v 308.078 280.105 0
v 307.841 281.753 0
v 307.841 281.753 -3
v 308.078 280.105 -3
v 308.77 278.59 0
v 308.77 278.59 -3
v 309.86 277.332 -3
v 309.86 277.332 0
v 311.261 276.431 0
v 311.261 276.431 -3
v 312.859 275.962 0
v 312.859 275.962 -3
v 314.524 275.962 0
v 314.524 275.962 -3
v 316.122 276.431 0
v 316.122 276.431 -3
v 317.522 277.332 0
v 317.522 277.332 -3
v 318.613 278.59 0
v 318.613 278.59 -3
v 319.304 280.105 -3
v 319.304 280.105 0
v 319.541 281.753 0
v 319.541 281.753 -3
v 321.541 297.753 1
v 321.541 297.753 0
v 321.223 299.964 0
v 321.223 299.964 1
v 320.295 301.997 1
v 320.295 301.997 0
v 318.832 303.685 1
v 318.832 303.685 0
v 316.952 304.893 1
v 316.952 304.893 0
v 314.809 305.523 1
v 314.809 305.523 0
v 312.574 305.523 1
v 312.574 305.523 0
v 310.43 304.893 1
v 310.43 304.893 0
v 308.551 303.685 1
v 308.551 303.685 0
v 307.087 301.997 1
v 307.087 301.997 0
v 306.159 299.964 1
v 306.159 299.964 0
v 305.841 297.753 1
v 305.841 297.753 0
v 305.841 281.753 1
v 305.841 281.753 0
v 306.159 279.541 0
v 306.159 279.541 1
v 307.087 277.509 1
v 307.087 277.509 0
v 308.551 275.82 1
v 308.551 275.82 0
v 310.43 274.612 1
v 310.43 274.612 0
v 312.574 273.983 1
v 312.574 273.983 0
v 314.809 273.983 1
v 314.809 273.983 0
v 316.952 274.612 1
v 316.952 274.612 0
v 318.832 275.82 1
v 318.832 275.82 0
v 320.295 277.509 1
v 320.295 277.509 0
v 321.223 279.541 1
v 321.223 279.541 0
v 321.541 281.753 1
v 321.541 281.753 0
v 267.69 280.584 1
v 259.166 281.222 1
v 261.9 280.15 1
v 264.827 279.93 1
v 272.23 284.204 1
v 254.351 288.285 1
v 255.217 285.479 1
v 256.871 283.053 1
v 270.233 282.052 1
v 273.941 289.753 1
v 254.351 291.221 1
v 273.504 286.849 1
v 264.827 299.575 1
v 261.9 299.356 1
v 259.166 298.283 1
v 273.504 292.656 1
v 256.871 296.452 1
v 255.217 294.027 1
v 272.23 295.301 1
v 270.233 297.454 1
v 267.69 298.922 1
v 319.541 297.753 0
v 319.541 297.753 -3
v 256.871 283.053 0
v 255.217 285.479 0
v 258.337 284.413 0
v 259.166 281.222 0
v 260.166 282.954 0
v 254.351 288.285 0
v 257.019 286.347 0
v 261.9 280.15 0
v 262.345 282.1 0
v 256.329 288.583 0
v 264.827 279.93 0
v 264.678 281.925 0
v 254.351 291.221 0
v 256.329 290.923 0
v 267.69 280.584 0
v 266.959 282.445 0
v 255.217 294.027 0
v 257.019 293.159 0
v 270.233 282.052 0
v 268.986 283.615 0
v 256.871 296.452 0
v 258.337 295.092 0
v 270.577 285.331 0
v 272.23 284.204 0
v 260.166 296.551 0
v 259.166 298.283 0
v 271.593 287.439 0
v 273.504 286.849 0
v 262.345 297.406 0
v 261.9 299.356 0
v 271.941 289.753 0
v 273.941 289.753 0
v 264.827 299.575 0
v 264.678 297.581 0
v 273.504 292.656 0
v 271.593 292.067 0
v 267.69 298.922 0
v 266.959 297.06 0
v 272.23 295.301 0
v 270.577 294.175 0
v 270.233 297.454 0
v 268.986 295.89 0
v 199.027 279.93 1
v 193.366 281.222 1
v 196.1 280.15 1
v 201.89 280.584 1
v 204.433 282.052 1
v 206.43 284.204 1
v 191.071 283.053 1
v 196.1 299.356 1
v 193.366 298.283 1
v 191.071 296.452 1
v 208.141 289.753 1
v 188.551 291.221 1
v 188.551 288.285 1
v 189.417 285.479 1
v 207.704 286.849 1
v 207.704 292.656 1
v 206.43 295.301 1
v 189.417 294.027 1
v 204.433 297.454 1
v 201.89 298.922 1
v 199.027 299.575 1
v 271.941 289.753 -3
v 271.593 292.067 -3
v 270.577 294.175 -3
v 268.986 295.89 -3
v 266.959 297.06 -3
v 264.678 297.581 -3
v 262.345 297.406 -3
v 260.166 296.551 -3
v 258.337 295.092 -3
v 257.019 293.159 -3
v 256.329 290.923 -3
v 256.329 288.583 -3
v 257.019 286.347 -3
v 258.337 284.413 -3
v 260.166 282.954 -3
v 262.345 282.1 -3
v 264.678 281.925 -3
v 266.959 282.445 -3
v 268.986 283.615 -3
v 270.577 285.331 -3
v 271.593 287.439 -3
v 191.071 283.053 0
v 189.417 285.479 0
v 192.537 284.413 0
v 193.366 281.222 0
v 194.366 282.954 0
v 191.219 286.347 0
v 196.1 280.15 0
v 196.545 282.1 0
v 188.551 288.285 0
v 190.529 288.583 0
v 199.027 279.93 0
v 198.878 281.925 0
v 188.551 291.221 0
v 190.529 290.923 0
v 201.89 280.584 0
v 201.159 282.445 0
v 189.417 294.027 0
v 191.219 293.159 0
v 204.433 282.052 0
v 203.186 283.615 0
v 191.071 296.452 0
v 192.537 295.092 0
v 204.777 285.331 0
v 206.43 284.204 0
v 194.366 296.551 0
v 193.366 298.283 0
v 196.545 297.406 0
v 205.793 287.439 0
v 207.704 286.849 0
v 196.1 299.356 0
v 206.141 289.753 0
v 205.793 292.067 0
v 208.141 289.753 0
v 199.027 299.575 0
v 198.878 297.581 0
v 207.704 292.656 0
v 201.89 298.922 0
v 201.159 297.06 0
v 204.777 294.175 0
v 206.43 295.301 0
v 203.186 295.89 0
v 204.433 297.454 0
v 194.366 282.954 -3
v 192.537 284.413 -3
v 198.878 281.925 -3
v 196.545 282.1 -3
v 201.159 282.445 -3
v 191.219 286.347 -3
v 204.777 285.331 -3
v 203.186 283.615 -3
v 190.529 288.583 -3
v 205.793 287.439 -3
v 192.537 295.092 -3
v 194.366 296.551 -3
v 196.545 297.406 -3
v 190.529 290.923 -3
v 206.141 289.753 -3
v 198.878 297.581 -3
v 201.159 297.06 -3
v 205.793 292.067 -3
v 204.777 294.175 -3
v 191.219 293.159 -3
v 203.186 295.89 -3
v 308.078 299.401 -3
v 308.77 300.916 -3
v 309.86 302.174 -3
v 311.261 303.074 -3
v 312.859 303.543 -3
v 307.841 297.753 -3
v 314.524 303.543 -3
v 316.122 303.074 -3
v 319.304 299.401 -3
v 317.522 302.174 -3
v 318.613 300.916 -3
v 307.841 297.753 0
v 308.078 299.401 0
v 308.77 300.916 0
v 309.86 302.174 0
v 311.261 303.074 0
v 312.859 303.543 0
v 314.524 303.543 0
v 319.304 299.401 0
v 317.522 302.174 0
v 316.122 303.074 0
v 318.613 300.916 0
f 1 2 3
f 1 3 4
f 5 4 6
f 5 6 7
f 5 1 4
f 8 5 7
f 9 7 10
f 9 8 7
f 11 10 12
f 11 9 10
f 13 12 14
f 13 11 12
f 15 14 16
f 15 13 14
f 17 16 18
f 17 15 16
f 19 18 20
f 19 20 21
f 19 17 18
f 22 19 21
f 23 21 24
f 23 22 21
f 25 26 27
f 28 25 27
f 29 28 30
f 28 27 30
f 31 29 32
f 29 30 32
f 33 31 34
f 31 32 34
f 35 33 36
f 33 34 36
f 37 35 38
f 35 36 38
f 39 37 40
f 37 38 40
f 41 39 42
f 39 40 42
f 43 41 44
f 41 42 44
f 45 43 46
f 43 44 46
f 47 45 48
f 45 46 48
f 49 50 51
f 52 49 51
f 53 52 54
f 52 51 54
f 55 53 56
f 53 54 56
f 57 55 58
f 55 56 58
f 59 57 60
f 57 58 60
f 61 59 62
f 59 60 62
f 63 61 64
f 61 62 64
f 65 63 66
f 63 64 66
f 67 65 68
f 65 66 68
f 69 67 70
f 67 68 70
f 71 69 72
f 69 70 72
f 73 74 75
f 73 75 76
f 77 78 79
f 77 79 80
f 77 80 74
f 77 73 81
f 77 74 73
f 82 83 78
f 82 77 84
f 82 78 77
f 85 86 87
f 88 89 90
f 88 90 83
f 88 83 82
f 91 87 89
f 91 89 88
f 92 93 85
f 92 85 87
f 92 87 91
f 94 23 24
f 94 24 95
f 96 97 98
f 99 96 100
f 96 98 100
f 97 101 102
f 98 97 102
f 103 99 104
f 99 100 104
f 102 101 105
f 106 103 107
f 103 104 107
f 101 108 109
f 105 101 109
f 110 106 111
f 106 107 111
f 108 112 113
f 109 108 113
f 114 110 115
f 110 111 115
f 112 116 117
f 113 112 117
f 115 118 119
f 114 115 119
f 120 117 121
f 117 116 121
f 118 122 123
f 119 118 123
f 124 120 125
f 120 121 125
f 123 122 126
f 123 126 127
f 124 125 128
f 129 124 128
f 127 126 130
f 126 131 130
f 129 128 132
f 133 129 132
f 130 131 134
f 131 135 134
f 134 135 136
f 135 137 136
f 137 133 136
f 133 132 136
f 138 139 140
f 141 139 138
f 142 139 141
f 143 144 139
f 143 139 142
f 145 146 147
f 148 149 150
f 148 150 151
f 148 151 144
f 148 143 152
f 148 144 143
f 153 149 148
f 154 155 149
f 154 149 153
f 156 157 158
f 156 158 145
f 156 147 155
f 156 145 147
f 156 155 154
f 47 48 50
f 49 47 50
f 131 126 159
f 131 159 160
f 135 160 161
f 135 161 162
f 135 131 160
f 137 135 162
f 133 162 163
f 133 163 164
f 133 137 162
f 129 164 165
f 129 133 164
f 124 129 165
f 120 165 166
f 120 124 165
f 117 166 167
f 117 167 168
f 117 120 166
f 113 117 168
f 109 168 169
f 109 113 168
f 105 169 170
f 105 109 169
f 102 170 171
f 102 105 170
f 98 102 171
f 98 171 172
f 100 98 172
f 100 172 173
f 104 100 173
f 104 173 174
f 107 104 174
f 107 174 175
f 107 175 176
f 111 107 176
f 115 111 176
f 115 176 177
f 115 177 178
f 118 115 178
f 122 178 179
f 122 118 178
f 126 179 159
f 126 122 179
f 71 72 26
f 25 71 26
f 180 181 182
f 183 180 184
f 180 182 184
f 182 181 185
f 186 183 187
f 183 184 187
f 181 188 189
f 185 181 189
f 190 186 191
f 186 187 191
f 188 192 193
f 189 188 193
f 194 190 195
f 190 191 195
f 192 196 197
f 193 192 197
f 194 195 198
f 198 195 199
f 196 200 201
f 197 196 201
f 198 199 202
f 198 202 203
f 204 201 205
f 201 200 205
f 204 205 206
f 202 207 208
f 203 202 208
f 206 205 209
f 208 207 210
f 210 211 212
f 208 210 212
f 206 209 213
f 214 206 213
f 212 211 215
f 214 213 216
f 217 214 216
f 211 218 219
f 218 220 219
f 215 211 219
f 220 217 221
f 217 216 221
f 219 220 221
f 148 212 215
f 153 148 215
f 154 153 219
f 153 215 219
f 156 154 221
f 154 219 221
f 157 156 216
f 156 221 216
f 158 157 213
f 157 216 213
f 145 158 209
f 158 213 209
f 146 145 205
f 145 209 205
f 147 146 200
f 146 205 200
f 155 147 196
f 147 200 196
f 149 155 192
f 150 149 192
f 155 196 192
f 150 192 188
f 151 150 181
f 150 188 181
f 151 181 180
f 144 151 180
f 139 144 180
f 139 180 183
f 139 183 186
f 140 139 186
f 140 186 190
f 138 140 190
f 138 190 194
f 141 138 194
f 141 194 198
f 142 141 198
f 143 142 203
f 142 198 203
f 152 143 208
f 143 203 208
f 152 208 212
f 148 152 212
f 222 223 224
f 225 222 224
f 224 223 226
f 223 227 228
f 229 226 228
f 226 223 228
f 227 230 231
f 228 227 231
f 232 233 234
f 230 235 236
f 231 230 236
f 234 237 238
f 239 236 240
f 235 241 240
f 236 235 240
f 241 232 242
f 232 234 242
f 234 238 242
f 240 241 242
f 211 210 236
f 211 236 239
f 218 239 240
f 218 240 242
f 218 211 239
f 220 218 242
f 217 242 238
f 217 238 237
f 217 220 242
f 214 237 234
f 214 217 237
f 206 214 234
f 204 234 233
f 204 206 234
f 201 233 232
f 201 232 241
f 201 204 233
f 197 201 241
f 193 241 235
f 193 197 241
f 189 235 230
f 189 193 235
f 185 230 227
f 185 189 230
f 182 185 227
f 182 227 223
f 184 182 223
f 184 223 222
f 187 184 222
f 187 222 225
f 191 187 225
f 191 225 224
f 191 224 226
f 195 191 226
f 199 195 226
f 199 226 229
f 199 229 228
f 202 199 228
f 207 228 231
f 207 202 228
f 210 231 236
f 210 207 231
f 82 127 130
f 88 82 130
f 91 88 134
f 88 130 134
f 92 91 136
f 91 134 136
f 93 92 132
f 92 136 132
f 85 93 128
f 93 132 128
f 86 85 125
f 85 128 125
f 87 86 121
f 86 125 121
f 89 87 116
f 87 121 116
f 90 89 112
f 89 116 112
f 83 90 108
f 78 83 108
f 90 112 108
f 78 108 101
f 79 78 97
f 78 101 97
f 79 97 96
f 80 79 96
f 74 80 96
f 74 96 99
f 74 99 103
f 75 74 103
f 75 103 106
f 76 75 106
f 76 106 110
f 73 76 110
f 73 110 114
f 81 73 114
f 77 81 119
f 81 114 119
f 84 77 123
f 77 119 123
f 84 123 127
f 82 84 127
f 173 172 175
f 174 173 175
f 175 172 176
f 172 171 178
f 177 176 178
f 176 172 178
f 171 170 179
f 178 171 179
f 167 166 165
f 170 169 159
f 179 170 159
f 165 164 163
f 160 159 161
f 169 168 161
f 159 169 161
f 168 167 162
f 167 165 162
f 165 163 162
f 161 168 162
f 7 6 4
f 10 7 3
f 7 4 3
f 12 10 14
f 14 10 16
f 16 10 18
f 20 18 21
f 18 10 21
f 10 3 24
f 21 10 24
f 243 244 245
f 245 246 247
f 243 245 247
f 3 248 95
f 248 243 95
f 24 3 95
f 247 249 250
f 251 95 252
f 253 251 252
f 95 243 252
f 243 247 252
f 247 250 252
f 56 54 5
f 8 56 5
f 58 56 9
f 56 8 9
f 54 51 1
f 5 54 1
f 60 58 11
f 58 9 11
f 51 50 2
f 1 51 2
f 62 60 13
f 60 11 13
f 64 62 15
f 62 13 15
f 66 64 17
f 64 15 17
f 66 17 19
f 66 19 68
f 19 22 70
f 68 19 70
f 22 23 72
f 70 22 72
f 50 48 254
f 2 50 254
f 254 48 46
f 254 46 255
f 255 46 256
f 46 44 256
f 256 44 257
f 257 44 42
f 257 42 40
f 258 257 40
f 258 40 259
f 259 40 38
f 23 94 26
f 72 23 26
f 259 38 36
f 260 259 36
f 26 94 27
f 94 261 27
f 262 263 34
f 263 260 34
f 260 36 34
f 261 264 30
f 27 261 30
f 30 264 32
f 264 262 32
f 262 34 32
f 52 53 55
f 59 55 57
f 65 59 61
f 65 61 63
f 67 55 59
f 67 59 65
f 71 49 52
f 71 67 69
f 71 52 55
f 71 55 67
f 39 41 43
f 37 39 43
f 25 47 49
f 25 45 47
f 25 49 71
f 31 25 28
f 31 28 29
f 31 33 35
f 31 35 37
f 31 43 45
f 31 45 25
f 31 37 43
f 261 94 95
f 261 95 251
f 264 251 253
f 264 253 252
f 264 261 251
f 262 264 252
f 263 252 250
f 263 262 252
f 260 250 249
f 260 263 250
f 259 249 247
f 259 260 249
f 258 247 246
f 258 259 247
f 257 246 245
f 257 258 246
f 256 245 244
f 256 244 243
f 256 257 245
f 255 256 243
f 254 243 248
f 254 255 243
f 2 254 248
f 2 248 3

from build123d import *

# Parameters (mm, degrees)
SKETCH1_R             = 7.85
BOSS_EXTRUDE1_DEPTH   = 3
BOSS_EXTRUDE1_2_DEPTH = 3
BOSS_EXTRUDE1_3_DEPTH = 3
SKETCH2_R             = 9.85
BOSS_EXTRUDE2_DEPTH   = 1


with BuildPart() as part:
    # Sketch1 → Boss-Extrude1 (new body)
    with BuildSketch(Plane.XY):
        with Locations((198.291338583, 289.752755906)):
            Circle(SKETCH1_R)
    extrude(amount=-BOSS_EXTRUDE1_DEPTH)



with BuildPart() as body_2:
    # Sketch1 → Boss-Extrude1 2 (new body)
    with BuildSketch(Plane.XY):
        with Locations((264.091338583, 289.752755906)):
            Circle(SKETCH1_R)
    extrude(amount=-BOSS_EXTRUDE1_2_DEPTH)


with BuildPart() as body_3:
    # Sketch1 → Boss-Extrude1 3 (new body)
    with BuildSketch(Plane.XY):
        with BuildLine():
            Line((307.841338583, 297.752755906), (307.841338583, 281.752755906))
            ThreePointArc((307.841338583, 281.752755906), (313.691338583, 275.902755906), (319.541338583, 281.752755906))
            Line((319.541338583, 281.752755906), (319.541338583, 297.752755906))
            ThreePointArc((319.541338583, 297.752755906), (313.691338583, 303.602755906), (307.841338583, 297.752755906))
        make_face()
    extrude(amount=-BOSS_EXTRUDE1_3_DEPTH)


with BuildPart() as part_1:
    add(part.part)

    add(body_2.part)  # Boss-Extrude2 merges body 2

    add(body_3.part)  # Boss-Extrude2 merges body 3
    # Sketch2 → Boss-Extrude2 (add)
    with BuildSketch(Plane.XY):
        with Locations((198.291338583, 289.752755906)):
            Circle(SKETCH2_R)
        with Locations((264.091338583, 289.752755906)):
            Circle(SKETCH2_R)
        with BuildLine():
            Line((305.841338583, 297.752755906), (305.841338583, 281.752755906))
            ThreePointArc((305.841338583, 281.752755906), (313.691338583, 273.902755906), (321.541338583, 281.752755906))
            Line((321.541338583, 281.752755906), (321.541338583, 297.752755906))
            ThreePointArc((321.541338583, 297.752755906), (313.691338583, 305.602755906), (305.841338583, 297.752755906))
        make_face()
    extrude(amount=BOSS_EXTRUDE2_DEPTH)


solid = part_1.part
